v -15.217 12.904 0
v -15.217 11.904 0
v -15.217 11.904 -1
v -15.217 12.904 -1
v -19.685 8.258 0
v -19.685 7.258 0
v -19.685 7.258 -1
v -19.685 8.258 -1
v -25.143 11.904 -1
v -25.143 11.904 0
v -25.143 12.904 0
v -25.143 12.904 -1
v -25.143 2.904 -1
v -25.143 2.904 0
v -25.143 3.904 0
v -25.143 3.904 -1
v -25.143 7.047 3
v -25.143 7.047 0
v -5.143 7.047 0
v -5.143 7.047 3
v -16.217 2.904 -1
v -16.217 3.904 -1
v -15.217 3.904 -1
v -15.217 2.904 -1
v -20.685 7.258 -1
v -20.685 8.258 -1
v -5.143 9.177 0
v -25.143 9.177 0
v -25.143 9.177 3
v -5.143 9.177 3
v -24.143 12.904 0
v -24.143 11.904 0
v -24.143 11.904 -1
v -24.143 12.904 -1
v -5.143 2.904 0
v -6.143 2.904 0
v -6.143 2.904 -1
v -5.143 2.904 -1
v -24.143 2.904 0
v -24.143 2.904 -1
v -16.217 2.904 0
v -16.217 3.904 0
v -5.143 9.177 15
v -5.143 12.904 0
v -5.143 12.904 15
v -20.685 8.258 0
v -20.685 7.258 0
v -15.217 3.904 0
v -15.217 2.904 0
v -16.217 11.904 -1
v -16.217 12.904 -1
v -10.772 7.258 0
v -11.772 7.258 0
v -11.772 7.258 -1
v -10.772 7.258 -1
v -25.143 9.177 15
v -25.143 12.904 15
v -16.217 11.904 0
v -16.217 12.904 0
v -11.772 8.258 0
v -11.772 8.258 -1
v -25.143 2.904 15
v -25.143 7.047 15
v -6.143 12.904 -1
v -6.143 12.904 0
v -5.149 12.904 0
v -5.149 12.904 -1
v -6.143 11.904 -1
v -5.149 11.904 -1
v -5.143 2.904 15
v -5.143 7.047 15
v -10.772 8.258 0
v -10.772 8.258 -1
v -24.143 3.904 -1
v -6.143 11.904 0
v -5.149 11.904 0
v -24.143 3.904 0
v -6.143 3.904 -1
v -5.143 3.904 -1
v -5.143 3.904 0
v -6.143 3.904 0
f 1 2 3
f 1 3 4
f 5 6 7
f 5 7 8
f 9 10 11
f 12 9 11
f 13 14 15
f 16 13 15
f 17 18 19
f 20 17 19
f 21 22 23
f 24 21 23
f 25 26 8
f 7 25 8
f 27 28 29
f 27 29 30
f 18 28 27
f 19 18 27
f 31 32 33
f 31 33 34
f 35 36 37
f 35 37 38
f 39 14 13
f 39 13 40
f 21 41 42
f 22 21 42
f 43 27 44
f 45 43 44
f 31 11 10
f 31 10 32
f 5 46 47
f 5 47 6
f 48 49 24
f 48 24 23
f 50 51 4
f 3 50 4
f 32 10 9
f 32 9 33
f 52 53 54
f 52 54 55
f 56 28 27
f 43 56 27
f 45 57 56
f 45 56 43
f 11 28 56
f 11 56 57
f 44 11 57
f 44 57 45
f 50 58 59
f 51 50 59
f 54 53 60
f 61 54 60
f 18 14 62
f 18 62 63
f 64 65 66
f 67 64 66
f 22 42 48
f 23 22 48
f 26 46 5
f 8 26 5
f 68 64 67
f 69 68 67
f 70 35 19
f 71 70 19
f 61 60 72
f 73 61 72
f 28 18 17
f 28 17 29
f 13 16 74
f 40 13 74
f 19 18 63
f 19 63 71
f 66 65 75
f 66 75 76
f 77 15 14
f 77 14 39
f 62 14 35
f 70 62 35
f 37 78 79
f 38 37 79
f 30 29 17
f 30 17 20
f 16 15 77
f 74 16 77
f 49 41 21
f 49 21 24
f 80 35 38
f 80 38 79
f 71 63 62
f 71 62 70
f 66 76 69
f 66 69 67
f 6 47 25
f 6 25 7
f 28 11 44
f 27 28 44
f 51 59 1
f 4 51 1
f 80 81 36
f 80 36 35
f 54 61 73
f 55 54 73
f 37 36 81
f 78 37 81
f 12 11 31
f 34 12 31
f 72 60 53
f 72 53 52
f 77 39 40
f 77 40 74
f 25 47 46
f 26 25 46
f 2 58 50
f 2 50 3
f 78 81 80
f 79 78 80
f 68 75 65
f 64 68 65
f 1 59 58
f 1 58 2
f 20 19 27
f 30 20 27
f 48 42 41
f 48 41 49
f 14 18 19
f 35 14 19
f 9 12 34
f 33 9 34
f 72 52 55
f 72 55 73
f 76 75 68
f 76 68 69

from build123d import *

# Parameters (mm, degrees)
F0_W     = 20
F0_H     = 3.72645418
F1_DEPTH = 15
F0_H_2   = 4.14354582
F0_H_3   = 2.13
F2_DEPTH = 3
F3_W     = 1
F3_H     = 1
F4_DEPTH = 1
F3_W_2   = 0.9941177852


with BuildPart() as f1:
    # F0 (on Top) → F1 (new body)
    with BuildSketch(Plane.XY):
        with Locations((-15.1428561658, 11.0407051996)):
            Rectangle(F0_W, F0_H)
    extrude(amount=F1_DEPTH)


with BuildPart() as f1b:
    # F0 (on Top) → F1, piece 2 (new body)
    with BuildSketch(Plane.XY):
        with Locations((-15.1428561658, 4.9757051996)):
            Rectangle(F0_W, F0_H_2)
    extrude(amount=F1_DEPTH)


with BuildPart() as f2:
    # F0 (on Top) → F2 (new body)
    with BuildSketch(Plane.XY):
        with Locations((-15.1428561658, 8.1124781096)):
            Rectangle(F0_W, F0_H_3)
    extrude(amount=F2_DEPTH)


with BuildPart() as f4:
    # F3 (on face) → F4 (new body)
    with BuildSketch(Plane.XY):
        with Locations((-24.6428075135, 3.4039124493)):
            Rectangle(F3_W, F3_H)
    extrude(amount=-F4_DEPTH)


with BuildPart() as f4b:
    # F3 (on face) → F4, piece 2 (new body)
    with BuildSketch(Plane.XY):
        with Locations((-5.6428075135, 3.4039124493)):
            Rectangle(F3_W, F3_H)
    extrude(amount=-F4_DEPTH)


with BuildPart() as f4c:
    # F3 (on face) → F4, piece 3 (new body)
    with BuildSketch(Plane.XY):
        with Locations((-5.6457486209, 12.4039124493)):
            Rectangle(F3_W_2, F3_H)
    extrude(amount=-F4_DEPTH)


with BuildPart() as f4d:
    # F3 (on face) → F4, piece 4 (new body)
    with BuildSketch(Plane.XY):
        with Locations((-11.2716742679, 7.7580650449)):
            Rectangle(F3_W, F3_H)
    extrude(amount=-F4_DEPTH)


with BuildPart() as f4e:
    # F3 (on face) → F4, piece 5 (new body)
    with BuildSketch(Plane.XY):
        with Locations((-20.1854846328, 7.7580650449)):
            Rectangle(F3_W, F3_H)
    extrude(amount=-F4_DEPTH)


with BuildPart() as f4f:
    # F3 (on face) → F4, piece 6 (new body)
    with BuildSketch(Plane.XY):
        with Locations((-24.6428075135, 12.4039124493)):
            Rectangle(F3_W, F3_H)
    extrude(amount=-F4_DEPTH)


with BuildPart() as f4g:
    # F3 (on face) → F4, piece 7 (new body)
    with BuildSketch(Plane.XY):
        with Locations((-15.7172392011, 12.4039124493)):
            Rectangle(F3_W, F3_H)
    extrude(amount=-F4_DEPTH)


with BuildPart() as f4h:
    # F3 (on face) → F4, piece 8 (new body)
    with BuildSketch(Plane.XY):
        with Locations((-15.7172392011, 3.4039124493)):
            Rectangle(F3_W, F3_H)
    extrude(amount=-F4_DEPTH)


solid = Compound([f1.part, f1b.part, f2.part, f4.part, f4b.part, f4c.part, f4d.part, f4e.part, f4f.part, f4g.part, f4h.part])
